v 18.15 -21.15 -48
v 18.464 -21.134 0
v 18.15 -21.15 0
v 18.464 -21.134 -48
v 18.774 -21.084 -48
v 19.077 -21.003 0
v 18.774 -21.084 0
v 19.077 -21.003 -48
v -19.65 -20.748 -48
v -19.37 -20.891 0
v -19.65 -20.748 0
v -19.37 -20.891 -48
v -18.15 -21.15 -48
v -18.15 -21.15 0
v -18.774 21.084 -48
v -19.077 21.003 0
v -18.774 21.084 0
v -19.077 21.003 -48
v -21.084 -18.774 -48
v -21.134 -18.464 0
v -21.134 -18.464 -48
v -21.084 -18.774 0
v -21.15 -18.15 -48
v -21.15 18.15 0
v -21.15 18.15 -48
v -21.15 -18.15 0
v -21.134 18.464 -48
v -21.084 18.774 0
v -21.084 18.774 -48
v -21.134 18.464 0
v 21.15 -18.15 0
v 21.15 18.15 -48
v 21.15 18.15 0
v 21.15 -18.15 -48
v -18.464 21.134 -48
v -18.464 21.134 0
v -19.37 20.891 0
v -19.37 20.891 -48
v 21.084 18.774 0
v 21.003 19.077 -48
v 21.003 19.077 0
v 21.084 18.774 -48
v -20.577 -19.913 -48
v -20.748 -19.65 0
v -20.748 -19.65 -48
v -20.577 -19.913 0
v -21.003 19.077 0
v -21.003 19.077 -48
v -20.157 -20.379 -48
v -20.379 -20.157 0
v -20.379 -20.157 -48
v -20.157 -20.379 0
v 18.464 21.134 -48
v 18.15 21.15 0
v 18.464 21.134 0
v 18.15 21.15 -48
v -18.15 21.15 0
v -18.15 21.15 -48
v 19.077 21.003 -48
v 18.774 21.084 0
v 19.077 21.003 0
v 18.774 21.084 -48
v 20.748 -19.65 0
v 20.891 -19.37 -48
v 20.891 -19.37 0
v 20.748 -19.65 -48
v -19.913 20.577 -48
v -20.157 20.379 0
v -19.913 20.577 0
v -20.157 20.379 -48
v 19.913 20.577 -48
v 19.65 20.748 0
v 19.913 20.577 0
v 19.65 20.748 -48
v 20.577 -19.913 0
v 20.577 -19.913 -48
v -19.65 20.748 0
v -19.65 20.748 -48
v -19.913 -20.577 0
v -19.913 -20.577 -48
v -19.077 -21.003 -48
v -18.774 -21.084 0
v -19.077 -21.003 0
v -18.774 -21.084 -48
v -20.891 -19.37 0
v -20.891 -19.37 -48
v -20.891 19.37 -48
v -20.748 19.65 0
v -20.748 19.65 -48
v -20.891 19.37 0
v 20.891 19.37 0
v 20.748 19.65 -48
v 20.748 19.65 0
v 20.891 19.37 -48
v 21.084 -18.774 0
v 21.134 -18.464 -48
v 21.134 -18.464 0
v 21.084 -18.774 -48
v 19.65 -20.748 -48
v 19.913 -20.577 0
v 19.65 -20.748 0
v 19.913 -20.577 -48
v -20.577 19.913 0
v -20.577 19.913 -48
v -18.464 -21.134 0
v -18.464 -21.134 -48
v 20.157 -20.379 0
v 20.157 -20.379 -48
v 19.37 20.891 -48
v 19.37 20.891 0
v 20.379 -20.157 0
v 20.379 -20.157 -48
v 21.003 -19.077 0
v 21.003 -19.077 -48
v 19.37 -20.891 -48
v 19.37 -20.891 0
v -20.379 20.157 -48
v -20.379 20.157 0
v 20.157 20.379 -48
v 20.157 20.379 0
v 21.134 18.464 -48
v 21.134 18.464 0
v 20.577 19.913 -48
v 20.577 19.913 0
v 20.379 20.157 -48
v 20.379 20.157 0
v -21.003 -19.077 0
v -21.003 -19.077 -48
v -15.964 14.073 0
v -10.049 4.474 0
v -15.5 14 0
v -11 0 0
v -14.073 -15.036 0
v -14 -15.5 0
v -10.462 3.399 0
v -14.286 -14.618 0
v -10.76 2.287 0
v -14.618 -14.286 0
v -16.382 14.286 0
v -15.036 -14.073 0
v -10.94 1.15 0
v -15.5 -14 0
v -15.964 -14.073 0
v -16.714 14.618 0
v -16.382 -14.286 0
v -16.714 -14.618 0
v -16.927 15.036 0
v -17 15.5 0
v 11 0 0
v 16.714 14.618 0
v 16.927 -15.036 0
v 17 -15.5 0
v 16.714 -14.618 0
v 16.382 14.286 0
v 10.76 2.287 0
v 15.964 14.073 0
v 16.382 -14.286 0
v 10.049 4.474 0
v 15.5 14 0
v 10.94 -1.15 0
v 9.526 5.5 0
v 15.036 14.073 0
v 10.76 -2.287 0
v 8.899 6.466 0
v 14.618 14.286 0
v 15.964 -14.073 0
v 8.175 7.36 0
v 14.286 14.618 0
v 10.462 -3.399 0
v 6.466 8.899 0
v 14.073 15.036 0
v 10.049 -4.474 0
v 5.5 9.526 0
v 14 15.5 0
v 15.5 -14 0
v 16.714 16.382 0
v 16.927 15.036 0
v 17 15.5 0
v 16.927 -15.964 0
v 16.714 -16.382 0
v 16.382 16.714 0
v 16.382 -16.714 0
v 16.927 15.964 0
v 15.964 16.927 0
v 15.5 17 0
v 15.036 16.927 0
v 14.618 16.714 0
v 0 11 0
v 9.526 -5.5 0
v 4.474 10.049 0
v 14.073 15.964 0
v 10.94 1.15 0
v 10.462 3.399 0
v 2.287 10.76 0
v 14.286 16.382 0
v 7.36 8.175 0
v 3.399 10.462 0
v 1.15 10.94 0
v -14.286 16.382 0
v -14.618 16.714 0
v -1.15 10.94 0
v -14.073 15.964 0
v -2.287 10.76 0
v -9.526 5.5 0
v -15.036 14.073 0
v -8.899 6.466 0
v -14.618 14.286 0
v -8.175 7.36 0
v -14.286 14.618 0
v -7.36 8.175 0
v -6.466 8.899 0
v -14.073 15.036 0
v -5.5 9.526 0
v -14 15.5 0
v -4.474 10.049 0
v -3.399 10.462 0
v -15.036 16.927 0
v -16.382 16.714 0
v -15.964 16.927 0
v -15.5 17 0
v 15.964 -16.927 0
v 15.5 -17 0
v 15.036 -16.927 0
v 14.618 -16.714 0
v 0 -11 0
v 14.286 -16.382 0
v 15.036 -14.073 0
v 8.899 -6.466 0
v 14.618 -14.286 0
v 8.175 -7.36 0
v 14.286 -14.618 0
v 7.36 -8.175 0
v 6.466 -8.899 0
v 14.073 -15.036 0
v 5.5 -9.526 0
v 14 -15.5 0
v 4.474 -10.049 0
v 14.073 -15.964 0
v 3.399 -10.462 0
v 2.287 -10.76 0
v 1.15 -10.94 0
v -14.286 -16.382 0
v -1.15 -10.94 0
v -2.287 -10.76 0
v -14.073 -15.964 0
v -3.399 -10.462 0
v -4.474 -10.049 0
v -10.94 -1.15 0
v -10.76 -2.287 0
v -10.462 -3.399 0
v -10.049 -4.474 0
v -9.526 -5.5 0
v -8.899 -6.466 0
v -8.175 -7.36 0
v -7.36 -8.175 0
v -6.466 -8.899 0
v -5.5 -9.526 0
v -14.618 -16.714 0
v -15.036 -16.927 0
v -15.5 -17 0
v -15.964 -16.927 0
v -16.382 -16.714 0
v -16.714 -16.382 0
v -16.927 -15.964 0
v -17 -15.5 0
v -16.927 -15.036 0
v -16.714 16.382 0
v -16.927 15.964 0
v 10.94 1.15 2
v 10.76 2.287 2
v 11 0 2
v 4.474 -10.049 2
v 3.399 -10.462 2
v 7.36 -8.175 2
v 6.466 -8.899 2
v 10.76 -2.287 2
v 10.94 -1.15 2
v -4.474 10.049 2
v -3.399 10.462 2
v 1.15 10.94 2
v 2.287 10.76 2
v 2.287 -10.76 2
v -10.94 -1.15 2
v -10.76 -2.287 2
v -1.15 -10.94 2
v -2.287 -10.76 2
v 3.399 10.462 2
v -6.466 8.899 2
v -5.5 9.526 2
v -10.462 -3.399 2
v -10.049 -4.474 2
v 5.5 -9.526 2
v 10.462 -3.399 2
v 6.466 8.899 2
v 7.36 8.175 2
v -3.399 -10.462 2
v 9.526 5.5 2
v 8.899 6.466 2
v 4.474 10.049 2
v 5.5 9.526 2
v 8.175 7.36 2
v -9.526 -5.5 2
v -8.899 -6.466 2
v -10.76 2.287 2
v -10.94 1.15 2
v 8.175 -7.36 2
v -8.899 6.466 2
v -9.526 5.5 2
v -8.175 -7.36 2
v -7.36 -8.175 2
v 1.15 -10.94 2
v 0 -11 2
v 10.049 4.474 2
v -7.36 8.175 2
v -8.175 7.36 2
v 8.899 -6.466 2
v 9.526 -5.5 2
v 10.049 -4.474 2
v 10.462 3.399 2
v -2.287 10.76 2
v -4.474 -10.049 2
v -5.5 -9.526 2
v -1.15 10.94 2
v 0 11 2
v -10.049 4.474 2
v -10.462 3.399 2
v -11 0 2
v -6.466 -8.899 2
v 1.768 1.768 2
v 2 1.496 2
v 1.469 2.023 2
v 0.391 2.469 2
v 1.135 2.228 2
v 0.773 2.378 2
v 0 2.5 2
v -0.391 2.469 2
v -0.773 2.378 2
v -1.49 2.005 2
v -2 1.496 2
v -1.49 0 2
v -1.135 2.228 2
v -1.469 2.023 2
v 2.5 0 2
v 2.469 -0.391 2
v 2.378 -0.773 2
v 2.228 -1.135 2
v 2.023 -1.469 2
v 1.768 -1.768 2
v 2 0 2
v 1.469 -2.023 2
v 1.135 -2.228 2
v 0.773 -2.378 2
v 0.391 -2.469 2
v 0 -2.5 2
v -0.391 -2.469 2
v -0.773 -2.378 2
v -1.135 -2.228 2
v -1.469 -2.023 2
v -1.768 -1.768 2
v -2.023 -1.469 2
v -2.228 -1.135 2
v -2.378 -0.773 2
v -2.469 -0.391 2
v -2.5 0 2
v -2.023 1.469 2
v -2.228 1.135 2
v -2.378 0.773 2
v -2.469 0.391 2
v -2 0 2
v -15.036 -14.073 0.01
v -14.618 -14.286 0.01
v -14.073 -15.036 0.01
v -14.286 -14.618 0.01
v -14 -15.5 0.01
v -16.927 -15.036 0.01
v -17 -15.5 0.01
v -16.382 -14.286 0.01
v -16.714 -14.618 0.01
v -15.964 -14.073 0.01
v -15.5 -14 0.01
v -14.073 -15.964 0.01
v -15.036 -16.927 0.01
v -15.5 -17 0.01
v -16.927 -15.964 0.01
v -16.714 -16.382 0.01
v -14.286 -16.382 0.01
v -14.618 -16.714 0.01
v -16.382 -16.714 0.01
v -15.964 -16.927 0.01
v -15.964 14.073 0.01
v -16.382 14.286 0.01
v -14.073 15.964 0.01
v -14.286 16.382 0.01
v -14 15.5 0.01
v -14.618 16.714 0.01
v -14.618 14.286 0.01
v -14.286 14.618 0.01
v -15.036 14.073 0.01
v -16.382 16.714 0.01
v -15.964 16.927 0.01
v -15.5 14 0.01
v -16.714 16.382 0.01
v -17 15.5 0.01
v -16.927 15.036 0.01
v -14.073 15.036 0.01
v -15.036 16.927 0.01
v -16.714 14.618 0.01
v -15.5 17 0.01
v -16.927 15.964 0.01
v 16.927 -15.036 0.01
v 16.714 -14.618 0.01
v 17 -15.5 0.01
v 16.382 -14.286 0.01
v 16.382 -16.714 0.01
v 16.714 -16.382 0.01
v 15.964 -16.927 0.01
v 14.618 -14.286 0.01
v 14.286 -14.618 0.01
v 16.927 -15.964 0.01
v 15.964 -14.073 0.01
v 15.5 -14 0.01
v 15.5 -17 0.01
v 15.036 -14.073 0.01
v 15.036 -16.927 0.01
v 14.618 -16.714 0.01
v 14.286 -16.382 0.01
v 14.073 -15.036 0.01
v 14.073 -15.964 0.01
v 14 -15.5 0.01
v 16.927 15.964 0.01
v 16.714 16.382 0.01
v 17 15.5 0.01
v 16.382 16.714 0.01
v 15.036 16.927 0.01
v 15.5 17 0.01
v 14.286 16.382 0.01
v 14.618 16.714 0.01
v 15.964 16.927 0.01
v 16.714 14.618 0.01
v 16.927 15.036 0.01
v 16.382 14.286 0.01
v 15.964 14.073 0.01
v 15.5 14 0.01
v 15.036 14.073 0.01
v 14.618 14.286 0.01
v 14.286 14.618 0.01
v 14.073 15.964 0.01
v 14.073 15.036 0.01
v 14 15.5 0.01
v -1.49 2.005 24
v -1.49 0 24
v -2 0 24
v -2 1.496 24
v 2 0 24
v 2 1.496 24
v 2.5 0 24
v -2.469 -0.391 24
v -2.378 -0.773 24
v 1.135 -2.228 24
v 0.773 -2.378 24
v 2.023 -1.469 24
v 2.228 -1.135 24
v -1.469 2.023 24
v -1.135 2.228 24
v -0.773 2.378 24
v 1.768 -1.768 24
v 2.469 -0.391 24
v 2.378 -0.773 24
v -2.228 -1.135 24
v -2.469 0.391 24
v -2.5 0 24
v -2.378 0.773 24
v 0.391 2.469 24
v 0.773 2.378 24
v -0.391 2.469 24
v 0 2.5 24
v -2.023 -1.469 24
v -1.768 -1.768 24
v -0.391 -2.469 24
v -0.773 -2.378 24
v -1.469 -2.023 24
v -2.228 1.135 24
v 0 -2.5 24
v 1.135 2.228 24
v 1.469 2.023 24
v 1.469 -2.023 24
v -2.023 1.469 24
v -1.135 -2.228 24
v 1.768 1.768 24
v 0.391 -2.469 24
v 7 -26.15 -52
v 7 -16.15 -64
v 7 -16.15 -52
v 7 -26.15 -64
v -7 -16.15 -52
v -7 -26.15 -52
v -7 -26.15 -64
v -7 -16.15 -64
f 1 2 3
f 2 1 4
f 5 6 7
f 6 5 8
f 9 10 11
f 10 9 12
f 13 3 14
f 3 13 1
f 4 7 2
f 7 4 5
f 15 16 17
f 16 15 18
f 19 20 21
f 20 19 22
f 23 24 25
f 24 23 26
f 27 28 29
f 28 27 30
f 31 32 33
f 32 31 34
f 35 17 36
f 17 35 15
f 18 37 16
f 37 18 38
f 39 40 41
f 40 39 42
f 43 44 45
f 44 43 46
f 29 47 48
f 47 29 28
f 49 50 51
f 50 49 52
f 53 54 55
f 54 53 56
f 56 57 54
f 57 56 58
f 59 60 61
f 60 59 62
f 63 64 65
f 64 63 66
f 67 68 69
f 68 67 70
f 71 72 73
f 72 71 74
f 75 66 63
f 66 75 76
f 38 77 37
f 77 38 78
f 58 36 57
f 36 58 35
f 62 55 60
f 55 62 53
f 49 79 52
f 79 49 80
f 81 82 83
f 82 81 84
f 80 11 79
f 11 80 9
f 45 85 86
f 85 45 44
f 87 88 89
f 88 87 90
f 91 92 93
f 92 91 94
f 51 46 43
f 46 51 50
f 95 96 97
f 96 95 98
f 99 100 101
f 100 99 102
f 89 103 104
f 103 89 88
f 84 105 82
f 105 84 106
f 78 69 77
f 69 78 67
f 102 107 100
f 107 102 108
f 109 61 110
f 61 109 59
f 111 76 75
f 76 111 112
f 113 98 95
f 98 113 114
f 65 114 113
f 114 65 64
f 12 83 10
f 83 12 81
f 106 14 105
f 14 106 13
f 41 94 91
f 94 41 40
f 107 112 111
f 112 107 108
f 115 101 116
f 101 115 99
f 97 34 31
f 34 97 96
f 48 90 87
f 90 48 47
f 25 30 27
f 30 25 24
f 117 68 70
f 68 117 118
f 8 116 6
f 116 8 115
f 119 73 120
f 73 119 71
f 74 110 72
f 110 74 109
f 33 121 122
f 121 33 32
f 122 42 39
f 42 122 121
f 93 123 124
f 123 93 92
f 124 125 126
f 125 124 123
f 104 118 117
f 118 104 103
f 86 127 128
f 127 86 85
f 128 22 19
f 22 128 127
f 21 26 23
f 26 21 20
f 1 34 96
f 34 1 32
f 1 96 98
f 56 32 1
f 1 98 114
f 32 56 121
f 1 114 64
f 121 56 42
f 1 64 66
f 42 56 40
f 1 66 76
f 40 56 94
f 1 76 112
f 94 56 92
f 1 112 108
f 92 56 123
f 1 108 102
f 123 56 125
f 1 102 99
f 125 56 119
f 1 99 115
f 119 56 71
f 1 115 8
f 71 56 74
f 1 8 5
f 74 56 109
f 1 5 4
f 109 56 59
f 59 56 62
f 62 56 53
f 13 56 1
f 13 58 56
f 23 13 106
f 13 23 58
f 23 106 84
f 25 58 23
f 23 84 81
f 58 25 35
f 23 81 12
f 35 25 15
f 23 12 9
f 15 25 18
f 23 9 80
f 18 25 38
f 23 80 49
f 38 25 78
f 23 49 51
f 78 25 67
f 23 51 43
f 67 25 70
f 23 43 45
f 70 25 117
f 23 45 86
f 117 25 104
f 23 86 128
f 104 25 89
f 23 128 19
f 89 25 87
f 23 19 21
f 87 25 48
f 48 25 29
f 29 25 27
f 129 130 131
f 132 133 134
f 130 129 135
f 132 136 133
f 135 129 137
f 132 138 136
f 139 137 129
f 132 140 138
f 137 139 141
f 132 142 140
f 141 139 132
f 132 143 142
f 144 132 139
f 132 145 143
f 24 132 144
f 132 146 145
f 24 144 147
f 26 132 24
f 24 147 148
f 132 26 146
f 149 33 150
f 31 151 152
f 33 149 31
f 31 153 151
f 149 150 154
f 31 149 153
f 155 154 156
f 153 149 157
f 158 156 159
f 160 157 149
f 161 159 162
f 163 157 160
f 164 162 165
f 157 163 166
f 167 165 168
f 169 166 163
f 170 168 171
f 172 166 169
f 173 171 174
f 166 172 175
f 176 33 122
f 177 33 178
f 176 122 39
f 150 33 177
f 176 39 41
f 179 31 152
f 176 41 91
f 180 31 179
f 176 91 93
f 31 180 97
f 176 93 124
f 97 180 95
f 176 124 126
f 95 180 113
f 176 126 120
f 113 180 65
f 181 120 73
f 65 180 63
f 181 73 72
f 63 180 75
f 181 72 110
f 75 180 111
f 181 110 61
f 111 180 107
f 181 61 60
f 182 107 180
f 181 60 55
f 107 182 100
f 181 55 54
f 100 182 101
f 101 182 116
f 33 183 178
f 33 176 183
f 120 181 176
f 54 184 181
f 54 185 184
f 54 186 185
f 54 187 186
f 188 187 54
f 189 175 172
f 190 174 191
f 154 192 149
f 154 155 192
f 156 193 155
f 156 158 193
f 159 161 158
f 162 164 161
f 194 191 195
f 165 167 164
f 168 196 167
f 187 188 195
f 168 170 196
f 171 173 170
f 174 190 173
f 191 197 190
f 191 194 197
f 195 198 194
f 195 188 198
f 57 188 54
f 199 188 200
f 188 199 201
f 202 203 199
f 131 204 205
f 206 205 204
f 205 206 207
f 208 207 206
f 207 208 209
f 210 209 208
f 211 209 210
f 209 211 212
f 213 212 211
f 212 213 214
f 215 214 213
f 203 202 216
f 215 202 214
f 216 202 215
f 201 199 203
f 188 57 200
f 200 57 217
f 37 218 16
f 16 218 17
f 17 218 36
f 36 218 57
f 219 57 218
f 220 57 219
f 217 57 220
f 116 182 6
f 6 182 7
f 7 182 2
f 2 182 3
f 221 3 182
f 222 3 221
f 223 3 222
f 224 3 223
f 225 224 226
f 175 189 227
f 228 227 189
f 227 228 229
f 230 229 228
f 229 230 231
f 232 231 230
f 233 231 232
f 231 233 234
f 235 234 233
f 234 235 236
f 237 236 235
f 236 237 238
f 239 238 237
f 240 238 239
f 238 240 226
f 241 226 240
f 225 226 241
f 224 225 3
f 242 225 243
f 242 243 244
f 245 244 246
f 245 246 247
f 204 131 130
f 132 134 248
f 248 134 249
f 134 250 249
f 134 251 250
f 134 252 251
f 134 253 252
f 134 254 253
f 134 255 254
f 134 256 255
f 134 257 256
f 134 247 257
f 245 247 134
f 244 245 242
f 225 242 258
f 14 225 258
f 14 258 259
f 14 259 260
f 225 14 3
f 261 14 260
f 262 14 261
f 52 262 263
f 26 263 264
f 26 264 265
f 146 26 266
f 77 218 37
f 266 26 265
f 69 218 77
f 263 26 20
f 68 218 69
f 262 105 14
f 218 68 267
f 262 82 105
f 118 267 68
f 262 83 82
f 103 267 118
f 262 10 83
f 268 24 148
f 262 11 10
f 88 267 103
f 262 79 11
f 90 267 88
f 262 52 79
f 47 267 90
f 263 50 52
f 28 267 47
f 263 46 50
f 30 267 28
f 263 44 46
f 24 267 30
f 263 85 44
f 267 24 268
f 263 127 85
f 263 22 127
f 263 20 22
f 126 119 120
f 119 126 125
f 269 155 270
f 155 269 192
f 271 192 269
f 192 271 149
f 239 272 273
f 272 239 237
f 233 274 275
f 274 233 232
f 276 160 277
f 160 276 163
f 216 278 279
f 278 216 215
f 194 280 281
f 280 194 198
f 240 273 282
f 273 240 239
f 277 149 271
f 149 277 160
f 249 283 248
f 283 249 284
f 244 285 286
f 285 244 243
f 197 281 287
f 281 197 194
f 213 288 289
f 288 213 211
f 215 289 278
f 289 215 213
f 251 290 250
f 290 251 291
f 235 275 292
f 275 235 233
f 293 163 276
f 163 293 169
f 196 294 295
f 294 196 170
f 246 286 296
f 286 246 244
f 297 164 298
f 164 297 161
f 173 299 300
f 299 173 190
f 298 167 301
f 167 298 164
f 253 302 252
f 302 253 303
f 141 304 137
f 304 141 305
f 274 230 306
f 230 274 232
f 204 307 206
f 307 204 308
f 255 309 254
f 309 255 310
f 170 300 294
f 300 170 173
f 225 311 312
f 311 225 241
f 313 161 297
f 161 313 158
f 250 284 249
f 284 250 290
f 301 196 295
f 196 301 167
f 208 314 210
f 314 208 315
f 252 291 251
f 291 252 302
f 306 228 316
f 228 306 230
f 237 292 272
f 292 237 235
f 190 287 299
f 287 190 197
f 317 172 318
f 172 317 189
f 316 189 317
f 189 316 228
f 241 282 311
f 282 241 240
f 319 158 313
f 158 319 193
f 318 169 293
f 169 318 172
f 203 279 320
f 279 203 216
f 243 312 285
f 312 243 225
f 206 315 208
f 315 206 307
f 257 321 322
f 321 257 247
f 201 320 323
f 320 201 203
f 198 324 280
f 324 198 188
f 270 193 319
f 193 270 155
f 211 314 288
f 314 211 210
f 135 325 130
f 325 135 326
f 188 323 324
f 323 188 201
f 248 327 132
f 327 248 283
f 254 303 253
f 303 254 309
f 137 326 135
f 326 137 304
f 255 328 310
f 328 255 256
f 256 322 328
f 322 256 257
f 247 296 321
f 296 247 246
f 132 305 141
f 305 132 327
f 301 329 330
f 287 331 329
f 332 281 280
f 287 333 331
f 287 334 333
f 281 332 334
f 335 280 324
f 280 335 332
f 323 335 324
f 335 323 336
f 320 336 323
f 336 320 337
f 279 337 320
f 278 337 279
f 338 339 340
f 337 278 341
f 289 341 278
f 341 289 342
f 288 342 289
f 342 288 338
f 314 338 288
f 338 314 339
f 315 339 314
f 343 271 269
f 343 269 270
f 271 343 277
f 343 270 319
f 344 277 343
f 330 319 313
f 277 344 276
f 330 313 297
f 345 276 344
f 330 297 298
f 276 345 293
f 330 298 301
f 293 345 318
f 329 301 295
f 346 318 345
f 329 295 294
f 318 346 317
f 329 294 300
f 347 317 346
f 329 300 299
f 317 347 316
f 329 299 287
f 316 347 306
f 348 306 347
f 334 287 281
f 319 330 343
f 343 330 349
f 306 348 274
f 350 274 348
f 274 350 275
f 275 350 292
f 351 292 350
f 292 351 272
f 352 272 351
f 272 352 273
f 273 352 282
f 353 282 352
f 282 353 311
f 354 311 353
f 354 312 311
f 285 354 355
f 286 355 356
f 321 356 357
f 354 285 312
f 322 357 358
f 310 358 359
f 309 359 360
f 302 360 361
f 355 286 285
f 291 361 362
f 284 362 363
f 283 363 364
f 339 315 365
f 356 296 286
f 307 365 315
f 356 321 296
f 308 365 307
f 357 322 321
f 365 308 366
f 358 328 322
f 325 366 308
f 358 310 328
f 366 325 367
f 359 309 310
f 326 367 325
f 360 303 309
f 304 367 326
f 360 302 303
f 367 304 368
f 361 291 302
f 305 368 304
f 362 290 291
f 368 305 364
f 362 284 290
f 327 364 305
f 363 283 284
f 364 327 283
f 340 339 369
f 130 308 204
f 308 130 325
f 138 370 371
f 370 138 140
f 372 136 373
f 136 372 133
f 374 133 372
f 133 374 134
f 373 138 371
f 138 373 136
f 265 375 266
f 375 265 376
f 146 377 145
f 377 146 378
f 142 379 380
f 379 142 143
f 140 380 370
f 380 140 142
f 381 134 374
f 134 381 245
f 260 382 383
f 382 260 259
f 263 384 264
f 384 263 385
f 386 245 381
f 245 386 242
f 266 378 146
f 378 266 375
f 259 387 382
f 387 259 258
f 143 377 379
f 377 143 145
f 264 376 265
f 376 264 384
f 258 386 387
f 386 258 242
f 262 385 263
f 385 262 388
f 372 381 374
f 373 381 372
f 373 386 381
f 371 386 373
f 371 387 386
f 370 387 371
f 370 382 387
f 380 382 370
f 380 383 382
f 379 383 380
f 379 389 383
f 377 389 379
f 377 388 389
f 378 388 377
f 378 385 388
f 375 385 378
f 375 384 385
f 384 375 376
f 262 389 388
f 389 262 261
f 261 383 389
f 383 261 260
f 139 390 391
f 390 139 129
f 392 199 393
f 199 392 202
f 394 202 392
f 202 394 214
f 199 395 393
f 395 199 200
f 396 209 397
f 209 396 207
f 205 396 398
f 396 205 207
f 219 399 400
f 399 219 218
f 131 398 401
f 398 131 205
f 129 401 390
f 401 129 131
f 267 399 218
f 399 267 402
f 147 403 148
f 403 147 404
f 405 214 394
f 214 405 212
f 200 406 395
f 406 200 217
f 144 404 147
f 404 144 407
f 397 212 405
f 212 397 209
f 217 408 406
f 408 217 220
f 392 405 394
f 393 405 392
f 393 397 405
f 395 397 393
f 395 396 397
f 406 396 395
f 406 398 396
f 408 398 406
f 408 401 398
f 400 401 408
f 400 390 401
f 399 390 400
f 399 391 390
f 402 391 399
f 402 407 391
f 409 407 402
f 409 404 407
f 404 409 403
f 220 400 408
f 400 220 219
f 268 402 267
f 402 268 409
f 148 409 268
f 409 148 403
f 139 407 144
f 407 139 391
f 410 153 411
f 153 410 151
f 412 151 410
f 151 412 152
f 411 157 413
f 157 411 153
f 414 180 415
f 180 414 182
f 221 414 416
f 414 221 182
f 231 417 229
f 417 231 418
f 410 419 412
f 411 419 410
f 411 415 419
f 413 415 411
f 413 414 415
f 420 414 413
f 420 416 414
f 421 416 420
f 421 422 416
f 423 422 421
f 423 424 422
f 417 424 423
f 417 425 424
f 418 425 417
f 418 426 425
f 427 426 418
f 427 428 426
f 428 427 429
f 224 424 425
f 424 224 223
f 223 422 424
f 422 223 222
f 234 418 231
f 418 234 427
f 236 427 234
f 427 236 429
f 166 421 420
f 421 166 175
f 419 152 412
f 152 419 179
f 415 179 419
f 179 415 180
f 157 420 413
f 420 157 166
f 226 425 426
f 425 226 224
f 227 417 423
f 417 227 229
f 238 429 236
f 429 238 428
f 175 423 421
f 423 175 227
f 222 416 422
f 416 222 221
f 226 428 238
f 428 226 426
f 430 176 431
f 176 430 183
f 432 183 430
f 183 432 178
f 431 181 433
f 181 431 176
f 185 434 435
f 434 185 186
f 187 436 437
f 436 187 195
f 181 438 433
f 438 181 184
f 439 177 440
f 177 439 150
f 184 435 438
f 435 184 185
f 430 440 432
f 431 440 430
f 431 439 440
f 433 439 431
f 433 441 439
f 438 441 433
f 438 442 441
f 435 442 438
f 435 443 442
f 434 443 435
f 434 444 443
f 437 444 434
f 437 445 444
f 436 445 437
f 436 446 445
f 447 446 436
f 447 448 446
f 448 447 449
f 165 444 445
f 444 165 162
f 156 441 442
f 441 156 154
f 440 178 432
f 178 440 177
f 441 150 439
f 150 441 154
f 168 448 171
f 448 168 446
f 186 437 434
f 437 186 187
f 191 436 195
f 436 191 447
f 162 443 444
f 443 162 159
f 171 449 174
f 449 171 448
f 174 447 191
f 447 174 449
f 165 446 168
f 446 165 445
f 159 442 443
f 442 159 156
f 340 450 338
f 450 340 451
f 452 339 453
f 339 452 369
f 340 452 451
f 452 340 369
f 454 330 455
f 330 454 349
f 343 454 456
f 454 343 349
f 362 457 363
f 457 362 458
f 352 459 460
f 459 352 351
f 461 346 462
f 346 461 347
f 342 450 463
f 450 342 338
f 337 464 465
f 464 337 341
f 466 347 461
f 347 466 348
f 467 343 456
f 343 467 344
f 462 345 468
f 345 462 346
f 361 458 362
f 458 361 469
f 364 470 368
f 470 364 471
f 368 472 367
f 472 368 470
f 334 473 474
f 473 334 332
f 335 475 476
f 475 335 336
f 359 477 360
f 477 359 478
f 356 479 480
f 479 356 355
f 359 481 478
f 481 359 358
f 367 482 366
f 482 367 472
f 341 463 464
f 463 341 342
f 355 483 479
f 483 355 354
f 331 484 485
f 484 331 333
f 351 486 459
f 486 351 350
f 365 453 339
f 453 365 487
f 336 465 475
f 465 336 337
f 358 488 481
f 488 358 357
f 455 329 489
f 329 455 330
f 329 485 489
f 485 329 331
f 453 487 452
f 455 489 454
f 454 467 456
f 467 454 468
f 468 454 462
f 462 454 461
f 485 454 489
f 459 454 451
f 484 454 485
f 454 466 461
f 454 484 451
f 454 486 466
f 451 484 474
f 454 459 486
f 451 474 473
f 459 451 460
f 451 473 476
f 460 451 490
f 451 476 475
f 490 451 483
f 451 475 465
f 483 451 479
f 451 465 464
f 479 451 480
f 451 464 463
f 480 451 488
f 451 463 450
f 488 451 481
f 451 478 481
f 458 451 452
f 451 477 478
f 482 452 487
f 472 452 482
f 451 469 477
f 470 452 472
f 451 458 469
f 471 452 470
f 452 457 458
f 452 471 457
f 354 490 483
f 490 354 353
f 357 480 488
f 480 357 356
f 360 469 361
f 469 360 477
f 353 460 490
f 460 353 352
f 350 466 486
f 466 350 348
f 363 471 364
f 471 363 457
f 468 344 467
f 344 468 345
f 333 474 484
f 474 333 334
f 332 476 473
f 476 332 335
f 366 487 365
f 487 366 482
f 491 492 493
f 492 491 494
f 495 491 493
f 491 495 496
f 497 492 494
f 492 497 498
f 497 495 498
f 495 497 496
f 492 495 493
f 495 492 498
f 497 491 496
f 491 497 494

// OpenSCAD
/*
   NEMA 17 Stepper Motor Model

   Model of NEMA 17 stepper motor (17HS19-2004S1 from STEPPERONLINE)
   for visualization in assemblies.

   Origin is centered on the shaft, on the front face of the motor,
   with the shaft in the +z direction (same convention as 28byj-48.scad)
*/

// ===== NEMA 17 DIMENSIONS (17HS19-2004S1) =====

// Body dimensions
nema17_body_width = 42.3;           // 42mm + tolerance
nema17_body_depth = 48;             // Motor body depth
nema17_body_corner_radius = 3;      // Rounded corners

// Front face raised section
nema17_front_face_diameter = 22;    // Raised circular section
nema17_front_face_height = 2;       // Height of raised section

// Shaft dimensions
nema17_shaft_diameter = 5.0;        // 5mm diameter
nema17_shaft_length = 24;           // Shaft length from front face
nema17_shaft_flat_width = 4.5;      // Width of flat (D-shaft)
nema17_shaft_flat_depth = 0.5;      // Depth of flat cut

// Mounting holes (M3)
nema17_mount_hole_diameter = 3.0;   // M3 hole
nema17_mount_hole_spacing = 31;     // 31mm between holes
nema17_mount_hole_depth = 4.5;      // Depth of mounting holes

// Rear shaft (optional, some motors have it)
nema17_rear_shaft_diameter = 5.0;   // Rear shaft diameter
nema17_rear_shaft_length = 15;      // Rear shaft length

// Wire connector
nema17_connector_width = 14;
nema17_connector_depth = 10;
nema17_connector_height = 12;

// Export functions for use in other files
function nema17_body_width() = nema17_body_width;
function nema17_body_depth() = nema17_body_depth;
function nema17_shaft_diameter() = nema17_shaft_diameter;
function nema17_shaft_length() = nema17_shaft_length;
function nema17_mount_hole_spacing() = nema17_mount_hole_spacing;

// ===== MOTOR MODEL =====

module nema17_motor() {
    $fn = 60;

    eps = 0.01;

    // Colors
    motor_body_color = [0.2, 0.2, 0.2];      // Dark gray
    shaft_color = [0.8, 0.8, 0.85];          // Steel
    connector_color = [0.1, 0.1, 0.1];       // Black

    // Main motor body
    module motor_body() {
        color(motor_body_color) {
            translate([0, 0, -nema17_body_depth]) {
                // Main body (rounded square)
                linear_extrude(height=nema17_body_depth) {
                    offset(r=nema17_body_corner_radius) {
                        square([nema17_body_width - nema17_body_corner_radius*2,
                                nema17_body_width - nema17_body_corner_radius*2],
                               center=true);
                    }
                }
            }

            // Front face raised section
            translate([0, 0, -eps]) {
                cylinder(d=nema17_front_face_diameter,
                        h=nema17_front_face_height + eps);
            }
        }
    }

    // Mounting holes
    module mounting_holes() {
        color(motor_body_color) {
            for (x = [-1, 1], y = [-1, 1]) {
                translate([x * nema17_mount_hole_spacing/2,
                          y * nema17_mount_hole_spacing/2,
                          -nema17_mount_hole_depth]) {
                    cylinder(d=nema17_mount_hole_diameter,
                            h=nema17_mount_hole_depth + eps,
                            $fn=20);
                }
            }
        }
    }

    // Shaft (5mm D-shaft)
    module shaft() {
        color(shaft_color) {
            difference() {
                // Main cylindrical shaft
                cylinder(d=nema17_shaft_diameter,
                        h=nema17_shaft_length,
                        $fn=40);

                // Cut flats (D-shaft profile)
                for (side = [-1, 1]) {
                    translate([side * (nema17_shaft_diameter/2 - nema17_shaft_flat_depth),
                              0,
                              -eps]) {
                        cube([nema17_shaft_flat_depth + eps,
                              nema17_shaft_diameter,
                              nema17_shaft_length + eps*2]);
                    }
                }
            }
        }
    }

    // Rear shaft (optional)
    module rear_shaft() {
        color(shaft_color) {
            translate([0, 0, -nema17_body_depth - nema17_rear_shaft_length]) {
                cylinder(d=nema17_rear_shaft_diameter,
                        h=nema17_rear_shaft_length + eps,
                        $fn=40);
            }
        }
    }

    // Wire connector on back
    module wire_connector() {
        color(connector_color) {
            translate([0,
                      -nema17_body_width/2,
                      -nema17_body_depth - nema17_connector_depth]) {
                cube([nema17_connector_width,
                      nema17_connector_depth,
                      nema17_connector_height],
                     center=true);
            }
        }
    }

    // Assemble motor
    motor_body();
    mounting_holes();
    shaft();
    // rear_shaft();  // Uncomment if your motor has rear shaft
    wire_connector();
}

// ===== MOUNTING BRACKET HELPERS =====

// 2D pattern for motor mounting holes (use in difference() for cutting)
module nema17_mount_holes_2d() {
    for (x = [-1, 1], y = [-1, 1]) {
        translate([x * nema17_mount_hole_spacing/2,
                  y * nema17_mount_hole_spacing/2]) {
            circle(d=3.2, $fn=30);  // 3.2mm for M3 clearance
        }
    }
}

// 2D motor body outline (for clearance cutouts)
module nema17_body_outline_2d(clearance=0.5) {
    offset(r=nema17_body_corner_radius + clearance) {
        square([nema17_body_width - nema17_body_corner_radius*2 + clearance*2,
                nema17_body_width - nema17_body_corner_radius*2 + clearance*2],
               center=true);
    }
}

// Example: render the motor
nema17_motor();
